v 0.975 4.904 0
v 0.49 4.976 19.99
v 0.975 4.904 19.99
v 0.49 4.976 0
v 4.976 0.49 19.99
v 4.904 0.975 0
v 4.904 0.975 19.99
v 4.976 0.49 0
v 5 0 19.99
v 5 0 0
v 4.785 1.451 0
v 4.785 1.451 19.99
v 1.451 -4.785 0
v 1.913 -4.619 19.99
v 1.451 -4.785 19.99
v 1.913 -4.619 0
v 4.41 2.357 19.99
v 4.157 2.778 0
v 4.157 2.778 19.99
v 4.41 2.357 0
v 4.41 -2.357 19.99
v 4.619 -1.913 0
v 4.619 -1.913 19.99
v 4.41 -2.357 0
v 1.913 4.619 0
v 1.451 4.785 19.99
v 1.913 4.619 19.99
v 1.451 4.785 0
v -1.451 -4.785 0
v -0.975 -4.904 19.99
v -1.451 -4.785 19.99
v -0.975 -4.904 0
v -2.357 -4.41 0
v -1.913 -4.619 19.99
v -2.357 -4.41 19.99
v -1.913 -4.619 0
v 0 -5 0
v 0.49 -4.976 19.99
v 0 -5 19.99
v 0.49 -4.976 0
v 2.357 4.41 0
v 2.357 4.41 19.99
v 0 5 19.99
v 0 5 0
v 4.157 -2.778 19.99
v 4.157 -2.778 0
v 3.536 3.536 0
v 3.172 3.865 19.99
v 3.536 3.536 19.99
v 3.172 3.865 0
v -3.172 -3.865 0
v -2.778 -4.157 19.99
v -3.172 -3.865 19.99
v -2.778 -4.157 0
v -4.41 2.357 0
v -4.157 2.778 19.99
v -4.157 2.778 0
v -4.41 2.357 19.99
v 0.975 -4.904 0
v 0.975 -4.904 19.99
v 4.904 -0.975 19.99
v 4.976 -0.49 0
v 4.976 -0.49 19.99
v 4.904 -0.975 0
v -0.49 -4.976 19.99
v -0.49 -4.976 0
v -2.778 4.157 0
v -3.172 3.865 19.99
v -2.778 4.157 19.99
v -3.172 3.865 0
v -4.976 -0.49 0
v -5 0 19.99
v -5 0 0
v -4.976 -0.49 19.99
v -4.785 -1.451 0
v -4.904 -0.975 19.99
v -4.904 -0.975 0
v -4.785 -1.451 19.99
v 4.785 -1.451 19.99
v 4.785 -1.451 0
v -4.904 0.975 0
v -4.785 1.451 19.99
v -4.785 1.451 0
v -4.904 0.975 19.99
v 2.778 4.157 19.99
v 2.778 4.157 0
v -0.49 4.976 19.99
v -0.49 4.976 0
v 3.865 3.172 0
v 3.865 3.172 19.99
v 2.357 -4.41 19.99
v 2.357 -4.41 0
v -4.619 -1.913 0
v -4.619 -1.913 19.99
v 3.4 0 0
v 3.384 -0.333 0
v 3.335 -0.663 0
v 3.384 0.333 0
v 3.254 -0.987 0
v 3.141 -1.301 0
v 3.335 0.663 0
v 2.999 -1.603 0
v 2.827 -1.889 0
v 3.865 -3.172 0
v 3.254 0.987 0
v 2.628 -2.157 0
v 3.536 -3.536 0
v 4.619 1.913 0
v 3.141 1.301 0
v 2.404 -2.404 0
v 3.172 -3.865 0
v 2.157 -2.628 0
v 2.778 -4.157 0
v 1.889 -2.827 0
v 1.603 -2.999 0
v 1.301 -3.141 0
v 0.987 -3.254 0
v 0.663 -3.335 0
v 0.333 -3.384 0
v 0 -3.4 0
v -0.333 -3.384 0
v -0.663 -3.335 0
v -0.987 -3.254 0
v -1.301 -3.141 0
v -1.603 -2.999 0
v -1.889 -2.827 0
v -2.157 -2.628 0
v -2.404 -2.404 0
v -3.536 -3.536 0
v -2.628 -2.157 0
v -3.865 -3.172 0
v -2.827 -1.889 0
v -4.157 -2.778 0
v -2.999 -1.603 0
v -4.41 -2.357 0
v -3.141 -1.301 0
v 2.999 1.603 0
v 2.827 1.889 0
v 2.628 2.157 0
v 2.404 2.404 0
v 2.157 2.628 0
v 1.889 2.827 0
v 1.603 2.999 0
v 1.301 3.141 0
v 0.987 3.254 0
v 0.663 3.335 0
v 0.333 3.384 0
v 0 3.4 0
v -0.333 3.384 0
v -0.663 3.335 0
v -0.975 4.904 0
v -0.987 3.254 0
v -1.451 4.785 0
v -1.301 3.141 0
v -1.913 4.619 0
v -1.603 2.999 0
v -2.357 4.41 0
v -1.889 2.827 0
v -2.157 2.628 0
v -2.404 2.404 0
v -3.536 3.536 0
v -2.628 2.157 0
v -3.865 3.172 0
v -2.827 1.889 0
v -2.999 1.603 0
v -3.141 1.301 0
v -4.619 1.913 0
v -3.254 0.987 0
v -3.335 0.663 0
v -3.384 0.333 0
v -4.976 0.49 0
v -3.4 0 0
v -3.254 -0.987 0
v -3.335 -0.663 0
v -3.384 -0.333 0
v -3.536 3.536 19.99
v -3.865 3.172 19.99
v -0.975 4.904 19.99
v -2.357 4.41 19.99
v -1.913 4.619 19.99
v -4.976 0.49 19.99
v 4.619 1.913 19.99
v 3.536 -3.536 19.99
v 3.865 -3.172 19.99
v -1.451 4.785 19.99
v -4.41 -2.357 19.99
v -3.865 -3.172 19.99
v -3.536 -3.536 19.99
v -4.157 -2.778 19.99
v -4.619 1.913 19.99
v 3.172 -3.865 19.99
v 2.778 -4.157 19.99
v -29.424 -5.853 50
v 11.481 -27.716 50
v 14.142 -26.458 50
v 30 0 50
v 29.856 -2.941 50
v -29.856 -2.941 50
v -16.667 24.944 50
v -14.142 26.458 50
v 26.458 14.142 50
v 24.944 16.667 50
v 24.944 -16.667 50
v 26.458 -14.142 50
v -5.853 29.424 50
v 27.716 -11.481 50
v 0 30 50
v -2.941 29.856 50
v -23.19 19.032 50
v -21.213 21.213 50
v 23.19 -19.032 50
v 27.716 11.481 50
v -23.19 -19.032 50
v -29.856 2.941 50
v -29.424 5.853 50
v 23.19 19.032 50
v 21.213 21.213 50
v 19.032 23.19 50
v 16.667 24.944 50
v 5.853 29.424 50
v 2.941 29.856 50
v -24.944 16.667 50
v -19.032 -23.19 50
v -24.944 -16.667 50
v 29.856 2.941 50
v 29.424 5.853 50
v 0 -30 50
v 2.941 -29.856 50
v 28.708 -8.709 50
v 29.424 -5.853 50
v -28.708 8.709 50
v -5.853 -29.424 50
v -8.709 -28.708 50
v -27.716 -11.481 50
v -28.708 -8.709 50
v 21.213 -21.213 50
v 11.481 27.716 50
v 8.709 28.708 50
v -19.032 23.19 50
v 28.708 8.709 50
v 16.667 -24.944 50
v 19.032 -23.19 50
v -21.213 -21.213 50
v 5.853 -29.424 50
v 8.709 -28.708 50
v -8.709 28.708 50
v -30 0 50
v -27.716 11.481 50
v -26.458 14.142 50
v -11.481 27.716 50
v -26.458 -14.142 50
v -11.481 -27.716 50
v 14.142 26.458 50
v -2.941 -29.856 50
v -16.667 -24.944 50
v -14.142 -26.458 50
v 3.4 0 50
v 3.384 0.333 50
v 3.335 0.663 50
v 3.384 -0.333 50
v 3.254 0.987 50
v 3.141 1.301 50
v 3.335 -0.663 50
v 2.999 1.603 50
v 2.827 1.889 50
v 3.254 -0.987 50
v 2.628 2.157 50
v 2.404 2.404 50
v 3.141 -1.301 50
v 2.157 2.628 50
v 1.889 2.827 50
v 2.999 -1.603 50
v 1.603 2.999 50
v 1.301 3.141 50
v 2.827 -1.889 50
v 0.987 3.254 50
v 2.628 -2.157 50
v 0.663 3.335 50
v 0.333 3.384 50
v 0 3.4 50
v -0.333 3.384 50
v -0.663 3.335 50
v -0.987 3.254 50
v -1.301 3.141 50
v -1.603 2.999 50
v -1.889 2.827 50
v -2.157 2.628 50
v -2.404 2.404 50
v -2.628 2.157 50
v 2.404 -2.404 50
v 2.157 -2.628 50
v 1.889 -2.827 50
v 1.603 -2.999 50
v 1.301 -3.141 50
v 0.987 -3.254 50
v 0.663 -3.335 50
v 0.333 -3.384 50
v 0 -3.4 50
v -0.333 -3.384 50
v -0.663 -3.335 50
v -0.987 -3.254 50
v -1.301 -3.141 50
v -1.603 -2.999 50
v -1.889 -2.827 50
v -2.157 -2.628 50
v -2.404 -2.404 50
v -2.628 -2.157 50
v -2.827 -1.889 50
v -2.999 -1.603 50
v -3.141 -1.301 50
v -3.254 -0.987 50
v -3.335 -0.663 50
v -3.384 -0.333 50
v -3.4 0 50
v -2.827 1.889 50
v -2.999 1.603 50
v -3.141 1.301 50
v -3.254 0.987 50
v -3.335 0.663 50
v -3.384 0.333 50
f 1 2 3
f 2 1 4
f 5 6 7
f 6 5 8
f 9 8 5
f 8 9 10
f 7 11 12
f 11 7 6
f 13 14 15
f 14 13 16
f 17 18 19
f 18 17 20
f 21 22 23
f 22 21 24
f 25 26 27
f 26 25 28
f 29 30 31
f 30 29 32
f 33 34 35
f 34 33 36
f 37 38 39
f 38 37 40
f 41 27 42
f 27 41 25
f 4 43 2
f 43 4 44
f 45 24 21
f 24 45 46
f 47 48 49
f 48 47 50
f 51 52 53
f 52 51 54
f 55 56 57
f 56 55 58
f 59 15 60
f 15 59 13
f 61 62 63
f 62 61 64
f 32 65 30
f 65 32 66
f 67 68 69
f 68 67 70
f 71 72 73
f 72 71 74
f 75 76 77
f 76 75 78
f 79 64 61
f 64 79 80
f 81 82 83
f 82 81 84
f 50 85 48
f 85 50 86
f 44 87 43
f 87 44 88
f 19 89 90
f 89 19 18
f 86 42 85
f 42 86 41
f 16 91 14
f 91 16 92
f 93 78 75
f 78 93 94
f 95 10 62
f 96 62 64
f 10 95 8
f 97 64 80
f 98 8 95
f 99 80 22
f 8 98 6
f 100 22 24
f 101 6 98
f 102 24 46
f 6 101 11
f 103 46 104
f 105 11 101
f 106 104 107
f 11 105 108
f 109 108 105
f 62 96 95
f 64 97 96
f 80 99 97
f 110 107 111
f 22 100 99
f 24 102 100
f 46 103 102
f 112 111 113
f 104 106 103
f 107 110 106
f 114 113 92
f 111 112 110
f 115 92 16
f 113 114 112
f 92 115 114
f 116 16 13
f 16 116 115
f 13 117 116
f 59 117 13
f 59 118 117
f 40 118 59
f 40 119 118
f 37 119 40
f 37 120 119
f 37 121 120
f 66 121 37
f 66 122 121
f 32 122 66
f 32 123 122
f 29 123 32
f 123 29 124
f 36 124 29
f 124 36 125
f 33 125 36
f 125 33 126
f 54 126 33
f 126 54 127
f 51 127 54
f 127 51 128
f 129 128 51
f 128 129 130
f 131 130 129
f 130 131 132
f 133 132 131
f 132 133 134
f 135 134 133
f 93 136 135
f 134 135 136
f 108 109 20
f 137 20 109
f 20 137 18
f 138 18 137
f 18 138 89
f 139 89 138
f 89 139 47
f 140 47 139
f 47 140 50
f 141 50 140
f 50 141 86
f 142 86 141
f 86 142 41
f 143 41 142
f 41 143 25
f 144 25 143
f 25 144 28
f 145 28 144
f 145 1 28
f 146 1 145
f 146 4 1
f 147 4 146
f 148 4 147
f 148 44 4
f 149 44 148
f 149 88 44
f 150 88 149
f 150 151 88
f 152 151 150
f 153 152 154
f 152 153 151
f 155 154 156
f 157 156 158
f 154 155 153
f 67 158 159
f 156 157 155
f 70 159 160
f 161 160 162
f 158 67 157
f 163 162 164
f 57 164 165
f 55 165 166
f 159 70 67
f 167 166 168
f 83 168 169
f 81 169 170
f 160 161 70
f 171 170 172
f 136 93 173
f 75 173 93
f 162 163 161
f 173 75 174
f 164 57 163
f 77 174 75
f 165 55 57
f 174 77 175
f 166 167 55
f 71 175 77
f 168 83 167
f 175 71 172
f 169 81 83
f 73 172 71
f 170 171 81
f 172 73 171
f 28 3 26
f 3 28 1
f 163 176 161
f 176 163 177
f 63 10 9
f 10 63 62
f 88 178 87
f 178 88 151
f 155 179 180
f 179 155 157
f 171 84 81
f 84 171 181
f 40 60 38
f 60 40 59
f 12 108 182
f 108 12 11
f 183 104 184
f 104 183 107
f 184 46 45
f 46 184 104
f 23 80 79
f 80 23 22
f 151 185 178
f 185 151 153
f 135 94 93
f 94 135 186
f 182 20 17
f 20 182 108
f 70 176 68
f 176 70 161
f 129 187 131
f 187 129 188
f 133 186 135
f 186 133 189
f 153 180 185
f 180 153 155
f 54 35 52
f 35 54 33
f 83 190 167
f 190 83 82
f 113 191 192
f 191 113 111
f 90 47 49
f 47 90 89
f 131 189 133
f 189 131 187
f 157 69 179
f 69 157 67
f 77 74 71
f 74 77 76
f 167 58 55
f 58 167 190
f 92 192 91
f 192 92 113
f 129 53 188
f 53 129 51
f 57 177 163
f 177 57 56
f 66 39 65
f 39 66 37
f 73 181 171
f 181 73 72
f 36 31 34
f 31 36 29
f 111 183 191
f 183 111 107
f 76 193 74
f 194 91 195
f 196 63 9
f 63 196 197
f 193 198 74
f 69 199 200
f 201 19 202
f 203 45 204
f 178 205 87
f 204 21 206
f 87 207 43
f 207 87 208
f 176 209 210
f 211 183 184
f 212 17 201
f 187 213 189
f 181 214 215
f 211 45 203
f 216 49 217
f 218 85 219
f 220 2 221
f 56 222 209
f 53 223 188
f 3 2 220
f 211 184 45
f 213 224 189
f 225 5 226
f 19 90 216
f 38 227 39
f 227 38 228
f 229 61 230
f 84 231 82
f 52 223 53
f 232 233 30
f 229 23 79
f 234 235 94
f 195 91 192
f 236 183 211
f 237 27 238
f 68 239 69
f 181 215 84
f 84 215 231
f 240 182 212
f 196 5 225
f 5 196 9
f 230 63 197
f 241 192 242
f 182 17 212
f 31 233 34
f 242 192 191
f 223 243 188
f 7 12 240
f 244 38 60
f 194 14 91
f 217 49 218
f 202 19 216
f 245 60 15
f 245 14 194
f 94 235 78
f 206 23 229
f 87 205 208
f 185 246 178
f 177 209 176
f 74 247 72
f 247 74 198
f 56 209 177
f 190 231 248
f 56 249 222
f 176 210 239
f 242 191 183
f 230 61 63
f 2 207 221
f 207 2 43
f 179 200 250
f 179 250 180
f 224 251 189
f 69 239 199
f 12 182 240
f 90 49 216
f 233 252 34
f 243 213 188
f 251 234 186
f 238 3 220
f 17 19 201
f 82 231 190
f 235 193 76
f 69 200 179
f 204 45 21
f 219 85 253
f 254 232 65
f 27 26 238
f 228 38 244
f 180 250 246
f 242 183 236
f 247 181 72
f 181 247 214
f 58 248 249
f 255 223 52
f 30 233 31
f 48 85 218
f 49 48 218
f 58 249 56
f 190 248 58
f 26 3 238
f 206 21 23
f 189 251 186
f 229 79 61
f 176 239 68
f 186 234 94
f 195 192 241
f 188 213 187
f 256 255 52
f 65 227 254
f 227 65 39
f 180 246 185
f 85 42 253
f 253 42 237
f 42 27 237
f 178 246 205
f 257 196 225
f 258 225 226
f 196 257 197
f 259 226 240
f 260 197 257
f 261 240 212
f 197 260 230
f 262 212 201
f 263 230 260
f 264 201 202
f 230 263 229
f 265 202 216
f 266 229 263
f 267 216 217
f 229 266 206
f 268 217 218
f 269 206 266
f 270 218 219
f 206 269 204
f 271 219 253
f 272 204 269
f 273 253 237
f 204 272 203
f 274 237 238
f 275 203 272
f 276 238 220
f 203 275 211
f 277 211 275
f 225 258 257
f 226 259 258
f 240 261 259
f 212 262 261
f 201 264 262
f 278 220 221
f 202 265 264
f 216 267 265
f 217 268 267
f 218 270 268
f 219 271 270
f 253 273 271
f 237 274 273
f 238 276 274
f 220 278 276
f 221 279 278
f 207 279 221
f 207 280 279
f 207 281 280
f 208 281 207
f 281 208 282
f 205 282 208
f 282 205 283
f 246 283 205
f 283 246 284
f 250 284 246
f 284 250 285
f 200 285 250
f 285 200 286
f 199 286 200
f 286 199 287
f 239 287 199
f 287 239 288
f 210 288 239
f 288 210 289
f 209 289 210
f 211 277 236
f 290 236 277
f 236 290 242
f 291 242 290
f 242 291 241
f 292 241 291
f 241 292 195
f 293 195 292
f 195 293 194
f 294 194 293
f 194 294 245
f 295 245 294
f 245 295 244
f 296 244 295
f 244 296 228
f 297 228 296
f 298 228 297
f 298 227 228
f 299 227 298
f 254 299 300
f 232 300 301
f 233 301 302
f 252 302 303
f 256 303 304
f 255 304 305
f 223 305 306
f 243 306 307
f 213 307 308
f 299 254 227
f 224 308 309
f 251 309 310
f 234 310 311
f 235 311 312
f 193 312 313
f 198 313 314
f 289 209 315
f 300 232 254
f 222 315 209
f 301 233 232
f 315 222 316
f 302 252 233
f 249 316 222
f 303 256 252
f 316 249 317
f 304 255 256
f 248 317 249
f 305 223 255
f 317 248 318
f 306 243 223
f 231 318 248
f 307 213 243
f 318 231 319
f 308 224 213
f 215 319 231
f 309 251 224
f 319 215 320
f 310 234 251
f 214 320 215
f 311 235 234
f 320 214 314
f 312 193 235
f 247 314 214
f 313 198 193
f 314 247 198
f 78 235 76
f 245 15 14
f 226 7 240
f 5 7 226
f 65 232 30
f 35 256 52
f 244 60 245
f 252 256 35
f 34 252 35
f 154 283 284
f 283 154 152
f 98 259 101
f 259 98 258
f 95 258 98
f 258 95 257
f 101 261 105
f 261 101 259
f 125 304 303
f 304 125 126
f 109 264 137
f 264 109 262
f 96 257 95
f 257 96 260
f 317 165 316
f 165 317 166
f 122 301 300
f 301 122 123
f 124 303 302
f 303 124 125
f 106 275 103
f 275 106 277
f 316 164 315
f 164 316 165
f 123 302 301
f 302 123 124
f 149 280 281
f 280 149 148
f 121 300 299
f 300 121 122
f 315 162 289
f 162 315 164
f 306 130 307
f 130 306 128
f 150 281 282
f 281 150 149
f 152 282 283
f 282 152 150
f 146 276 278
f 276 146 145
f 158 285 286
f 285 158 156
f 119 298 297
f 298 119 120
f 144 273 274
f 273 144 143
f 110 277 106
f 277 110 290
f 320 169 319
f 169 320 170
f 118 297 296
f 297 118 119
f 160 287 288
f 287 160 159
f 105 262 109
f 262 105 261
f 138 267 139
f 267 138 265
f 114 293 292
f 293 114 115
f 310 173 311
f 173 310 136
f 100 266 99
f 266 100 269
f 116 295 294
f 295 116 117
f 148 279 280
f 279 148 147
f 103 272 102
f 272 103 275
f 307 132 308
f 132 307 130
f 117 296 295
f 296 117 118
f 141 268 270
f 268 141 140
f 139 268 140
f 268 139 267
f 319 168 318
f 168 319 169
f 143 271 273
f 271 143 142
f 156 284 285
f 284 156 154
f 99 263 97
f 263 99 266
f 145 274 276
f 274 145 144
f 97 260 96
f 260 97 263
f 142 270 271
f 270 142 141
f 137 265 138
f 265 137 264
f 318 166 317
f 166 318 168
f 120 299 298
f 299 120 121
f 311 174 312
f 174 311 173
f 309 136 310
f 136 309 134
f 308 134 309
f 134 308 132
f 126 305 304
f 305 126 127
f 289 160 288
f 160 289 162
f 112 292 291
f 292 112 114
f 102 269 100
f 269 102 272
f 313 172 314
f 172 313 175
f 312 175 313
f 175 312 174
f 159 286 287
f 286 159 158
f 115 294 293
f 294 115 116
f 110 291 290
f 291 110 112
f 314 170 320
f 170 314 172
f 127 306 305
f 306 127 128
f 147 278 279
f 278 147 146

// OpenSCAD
// Lab funnel - printed upright with wide opening at the top
// Units: mm

$fn = 64;

// --- Dimensions ---
spout_od      = 10;    // spout outer diameter
spout_h       = 20;    // spout height (z = 0 to 20)
cone_od_top   = 60;    // cone outer diameter at rim
cone_h        = 30;    // cone height (z = 20 to 50)
wall          = 1.6;   // wall thickness everywhere
eps           = 0.5;   // cutter overshoot

bore = spout_od - 2 * wall;   // spout bore = 6.8 mm

difference() {
    union() {
        // Spout
        cylinder(d = spout_od, h = spout_h);
        // Cone (slightly overlapping spout for a clean union)
        translate([0, 0, spout_h - 0.01])
            cylinder(d1 = spout_od, d2 = cone_od_top, h = cone_h + 0.01);
    }
    // Through-bore along the axis
    translate([0, 0, -eps])
        cylinder(d = bore, h = spout_h + cone_h + 2 * eps);
}
